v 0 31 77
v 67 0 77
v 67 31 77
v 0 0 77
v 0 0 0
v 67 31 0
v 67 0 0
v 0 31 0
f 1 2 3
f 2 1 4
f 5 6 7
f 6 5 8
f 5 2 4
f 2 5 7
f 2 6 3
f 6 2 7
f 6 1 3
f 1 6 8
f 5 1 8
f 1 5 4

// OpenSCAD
//67x93x22
x=67;
y=31;
z=77;
//square([x+4,y+4]);
//difference() {
    translate([0,0,0])
//    cube([x+2,y+2,z+2]);
//    translate([1,1,3])
    cube([x,y,z]);
//    translate([5,0,15])
//    cube([x-8,y,z-20]);
//}
